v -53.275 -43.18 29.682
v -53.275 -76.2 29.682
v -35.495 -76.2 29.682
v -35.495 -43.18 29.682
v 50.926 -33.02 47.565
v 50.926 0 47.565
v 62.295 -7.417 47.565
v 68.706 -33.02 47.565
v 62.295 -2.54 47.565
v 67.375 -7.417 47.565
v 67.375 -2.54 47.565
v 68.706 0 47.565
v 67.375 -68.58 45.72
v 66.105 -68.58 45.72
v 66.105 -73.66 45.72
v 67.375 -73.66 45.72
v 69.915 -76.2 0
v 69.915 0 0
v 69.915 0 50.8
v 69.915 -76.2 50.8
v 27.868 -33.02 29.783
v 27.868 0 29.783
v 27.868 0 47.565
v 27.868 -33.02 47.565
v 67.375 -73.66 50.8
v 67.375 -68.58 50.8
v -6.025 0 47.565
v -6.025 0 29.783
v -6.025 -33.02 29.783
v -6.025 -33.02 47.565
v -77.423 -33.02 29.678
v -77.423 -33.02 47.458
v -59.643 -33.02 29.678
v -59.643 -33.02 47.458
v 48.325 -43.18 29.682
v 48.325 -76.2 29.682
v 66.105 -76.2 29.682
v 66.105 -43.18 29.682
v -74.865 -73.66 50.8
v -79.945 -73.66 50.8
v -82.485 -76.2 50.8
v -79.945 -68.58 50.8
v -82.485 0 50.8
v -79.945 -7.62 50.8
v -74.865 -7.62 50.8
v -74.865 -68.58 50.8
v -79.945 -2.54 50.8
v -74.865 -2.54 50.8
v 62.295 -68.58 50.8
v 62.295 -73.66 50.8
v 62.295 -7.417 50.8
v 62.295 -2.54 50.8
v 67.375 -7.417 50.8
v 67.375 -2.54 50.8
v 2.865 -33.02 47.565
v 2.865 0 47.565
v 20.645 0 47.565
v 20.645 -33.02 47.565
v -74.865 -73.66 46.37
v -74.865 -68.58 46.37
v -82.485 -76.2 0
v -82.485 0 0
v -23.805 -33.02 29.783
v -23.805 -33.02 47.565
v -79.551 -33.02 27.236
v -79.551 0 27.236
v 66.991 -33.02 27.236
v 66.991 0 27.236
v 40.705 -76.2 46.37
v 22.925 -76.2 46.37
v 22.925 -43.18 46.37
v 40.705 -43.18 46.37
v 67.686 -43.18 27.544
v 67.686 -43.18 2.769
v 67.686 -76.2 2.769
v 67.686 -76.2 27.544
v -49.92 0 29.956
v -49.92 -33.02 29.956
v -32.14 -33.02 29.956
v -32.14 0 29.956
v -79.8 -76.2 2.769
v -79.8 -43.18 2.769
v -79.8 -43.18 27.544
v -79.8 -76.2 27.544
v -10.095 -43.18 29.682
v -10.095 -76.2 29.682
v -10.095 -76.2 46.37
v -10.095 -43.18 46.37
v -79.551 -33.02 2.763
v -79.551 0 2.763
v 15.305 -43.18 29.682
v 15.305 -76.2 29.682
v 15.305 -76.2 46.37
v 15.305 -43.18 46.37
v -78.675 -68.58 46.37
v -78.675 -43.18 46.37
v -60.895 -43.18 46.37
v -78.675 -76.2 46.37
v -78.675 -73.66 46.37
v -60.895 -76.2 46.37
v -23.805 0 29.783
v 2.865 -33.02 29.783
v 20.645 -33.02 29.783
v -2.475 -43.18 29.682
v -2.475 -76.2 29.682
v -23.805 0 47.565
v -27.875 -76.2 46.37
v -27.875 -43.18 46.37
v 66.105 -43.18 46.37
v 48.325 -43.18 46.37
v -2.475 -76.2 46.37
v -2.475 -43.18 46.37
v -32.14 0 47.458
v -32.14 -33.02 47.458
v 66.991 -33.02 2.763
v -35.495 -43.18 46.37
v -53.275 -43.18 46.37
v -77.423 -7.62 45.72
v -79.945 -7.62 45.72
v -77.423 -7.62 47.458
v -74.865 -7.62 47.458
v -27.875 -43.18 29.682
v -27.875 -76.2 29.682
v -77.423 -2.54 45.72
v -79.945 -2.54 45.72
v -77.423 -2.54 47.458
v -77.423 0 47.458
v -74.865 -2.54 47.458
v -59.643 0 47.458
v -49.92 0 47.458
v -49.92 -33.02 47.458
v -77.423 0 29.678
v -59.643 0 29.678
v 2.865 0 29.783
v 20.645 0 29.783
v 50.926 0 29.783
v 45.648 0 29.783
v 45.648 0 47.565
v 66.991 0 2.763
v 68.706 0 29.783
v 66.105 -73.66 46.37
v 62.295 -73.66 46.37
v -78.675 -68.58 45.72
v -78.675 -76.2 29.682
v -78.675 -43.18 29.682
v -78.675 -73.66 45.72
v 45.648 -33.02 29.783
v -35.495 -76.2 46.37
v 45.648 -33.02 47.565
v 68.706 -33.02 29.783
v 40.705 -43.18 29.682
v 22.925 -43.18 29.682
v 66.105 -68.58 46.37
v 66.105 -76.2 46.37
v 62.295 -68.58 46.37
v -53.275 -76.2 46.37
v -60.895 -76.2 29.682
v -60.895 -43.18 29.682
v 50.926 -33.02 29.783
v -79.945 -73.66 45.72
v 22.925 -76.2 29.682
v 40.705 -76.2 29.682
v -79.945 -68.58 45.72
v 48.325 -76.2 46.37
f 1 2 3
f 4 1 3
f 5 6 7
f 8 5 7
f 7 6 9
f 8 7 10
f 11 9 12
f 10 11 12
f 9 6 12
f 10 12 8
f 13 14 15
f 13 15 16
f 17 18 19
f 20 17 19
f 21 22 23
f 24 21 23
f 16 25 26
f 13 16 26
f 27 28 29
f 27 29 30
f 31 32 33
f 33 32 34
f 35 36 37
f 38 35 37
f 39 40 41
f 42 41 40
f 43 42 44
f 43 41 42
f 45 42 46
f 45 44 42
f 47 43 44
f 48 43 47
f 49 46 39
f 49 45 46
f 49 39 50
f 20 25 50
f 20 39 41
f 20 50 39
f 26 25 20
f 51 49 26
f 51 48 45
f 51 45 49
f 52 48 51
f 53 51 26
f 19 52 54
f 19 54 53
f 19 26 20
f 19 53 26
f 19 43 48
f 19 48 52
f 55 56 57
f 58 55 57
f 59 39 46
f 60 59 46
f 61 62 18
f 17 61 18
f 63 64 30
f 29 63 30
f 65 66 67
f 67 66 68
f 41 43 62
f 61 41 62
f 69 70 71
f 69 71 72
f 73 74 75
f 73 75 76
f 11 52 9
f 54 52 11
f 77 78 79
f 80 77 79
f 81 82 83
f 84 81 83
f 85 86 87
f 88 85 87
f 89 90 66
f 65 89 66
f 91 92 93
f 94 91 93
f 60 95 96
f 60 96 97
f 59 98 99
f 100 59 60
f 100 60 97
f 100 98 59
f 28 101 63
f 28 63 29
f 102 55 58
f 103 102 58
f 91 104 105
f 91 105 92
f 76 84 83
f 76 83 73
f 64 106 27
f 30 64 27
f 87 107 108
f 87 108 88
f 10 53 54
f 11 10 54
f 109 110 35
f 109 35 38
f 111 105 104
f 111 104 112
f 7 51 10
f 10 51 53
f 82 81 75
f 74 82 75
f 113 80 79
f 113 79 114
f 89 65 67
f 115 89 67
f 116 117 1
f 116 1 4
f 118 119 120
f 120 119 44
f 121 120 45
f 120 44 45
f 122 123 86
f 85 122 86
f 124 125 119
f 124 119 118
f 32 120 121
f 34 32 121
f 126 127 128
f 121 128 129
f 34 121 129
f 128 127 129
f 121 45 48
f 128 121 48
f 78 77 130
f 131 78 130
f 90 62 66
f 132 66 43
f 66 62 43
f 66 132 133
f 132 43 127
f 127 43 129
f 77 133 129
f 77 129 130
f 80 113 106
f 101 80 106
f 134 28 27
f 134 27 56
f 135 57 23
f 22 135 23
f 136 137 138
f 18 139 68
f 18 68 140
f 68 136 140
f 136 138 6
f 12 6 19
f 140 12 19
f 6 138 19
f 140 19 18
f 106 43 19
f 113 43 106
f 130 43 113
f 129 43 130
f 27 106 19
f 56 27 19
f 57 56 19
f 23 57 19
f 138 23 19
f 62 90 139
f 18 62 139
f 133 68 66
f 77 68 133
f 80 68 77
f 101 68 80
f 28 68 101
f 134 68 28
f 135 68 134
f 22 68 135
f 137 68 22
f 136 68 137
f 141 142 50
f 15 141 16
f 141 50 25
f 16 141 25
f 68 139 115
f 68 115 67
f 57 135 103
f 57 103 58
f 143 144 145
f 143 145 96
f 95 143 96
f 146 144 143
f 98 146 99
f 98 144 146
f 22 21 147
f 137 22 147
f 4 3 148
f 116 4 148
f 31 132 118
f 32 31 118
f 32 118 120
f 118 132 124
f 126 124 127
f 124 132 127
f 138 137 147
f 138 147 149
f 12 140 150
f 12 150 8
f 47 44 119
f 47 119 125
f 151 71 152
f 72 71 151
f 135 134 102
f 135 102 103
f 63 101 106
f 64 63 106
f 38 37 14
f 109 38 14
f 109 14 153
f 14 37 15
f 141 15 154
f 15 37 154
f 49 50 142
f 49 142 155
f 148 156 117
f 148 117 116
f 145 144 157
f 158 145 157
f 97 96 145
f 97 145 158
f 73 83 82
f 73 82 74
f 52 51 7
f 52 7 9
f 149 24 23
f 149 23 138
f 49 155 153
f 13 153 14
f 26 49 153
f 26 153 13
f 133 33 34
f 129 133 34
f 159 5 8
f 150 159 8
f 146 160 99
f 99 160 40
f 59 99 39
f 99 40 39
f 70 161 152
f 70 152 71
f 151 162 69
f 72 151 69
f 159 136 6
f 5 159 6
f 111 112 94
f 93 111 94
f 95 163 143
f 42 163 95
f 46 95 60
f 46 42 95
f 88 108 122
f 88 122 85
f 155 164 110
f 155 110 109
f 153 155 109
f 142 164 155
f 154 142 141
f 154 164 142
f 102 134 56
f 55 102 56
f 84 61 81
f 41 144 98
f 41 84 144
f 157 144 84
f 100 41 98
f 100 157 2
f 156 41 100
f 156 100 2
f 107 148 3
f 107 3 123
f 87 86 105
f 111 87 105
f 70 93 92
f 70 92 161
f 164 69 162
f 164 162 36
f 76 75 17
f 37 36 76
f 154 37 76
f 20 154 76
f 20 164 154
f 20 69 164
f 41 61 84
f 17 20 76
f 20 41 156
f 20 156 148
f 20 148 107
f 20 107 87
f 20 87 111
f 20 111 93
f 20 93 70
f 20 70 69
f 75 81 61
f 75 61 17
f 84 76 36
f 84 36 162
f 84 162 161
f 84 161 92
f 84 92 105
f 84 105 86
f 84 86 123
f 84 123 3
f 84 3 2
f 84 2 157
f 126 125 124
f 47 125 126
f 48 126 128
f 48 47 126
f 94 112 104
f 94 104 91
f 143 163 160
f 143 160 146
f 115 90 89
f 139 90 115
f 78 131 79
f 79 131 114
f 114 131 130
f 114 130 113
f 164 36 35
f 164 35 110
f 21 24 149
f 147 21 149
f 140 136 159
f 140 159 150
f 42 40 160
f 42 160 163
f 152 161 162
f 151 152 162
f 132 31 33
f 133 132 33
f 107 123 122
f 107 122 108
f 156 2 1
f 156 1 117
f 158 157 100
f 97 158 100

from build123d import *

# Parameters (mm, degrees)
F0_W      = 152.4
F0_H      = 25.4
F1_DEPTH  = 76.2
F2_W      = 17.78
F2_H      = 17.78
F2_H_2    = 17.502186
F2_H_3    = 17.781453
F3_DEPTH  = 33.02
F4_W      = 17.78
F4_H      = 16.6878
F5_DEPTH  = 33.02
F6_W      = 146.541581
F6_H      = 24.47215
F7_DEPTH  = 33.02
F8_W      = 147.48656
F8_H      = 24.775412
F10_DEPTH = 33.02
F11_W     = 5.08
F11_H     = 5.08
F11_H_2   = 4.8768
F11_H_3   = 5.080004
F12_DEPTH = 5.08


with BuildPart() as f1:
    # F0 (on Front) → F1 (new body)
    with BuildSketch(Plane.XZ):
        with Locations((-6.284538, 38.1)):
            Rectangle(F0_W, F0_H)
        with Locations((-6.284538, 12.7)):
            Rectangle(F0_W, F0_H)
    extrude(amount=F1_DEPTH)

    # F2 (on Front) → F3 (cut)
    with BuildSketch(Plane.XZ):
        with Locations((-68.533134, 38.567891)):
            Rectangle(F2_W, F2_H)
        with Locations((-41.029694, 38.706798)):
            Rectangle(F2_W, F2_H_2)
        with Locations((-14.915321, 38.673893)):
            Rectangle(F2_W, F2_H_3)
        with Locations((11.754678, 38.673893)):
            Rectangle(F2_W, F2_H_3)
        with Locations((36.757799, 38.673893)):
            Rectangle(F2_W, F2_H_3)
        with Locations((59.816236, 38.673893)):
            Rectangle(F2_W, F2_H_3)
    extrude(amount=F3_DEPTH, mode=Mode.SUBTRACT)

    # F4 (on face) → F5 (cut)
    with BuildSketch(Plane.XZ.offset(76.2)):
        with Locations((-69.784538, 38.026275)):
            Rectangle(F4_W, F4_H)
        with Locations((-44.384538, 38.026275)):
            Rectangle(F4_W, F4_H)
        with Locations((-18.984538, 38.026275)):
            Rectangle(F4_W, F4_H)
        with Locations((6.415462, 38.026275)):
            Rectangle(F4_W, F4_H)
        with Locations((31.815462, 38.026275)):
            Rectangle(F4_W, F4_H)
        with Locations((57.215462, 38.026275)):
            Rectangle(F4_W, F4_H)
    extrude(amount=-F5_DEPTH, mode=Mode.SUBTRACT)

    # F6 (on Front) → F7 (cut)
    with BuildSketch(Plane.XZ):
        with Locations((-6.280116, 14.999481)):
            Rectangle(F6_W, F6_H)
    extrude(amount=F7_DEPTH, mode=Mode.SUBTRACT)

    # F8 (on face) → F10 (cut)
    with BuildSketch(Plane.XZ.offset(76.2)):
        with Locations((-6.05702, 15.156722)):
            Rectangle(F8_W, F8_H)
    extrude(amount=-F10_DEPTH, mode=Mode.SUBTRACT)

    # F11 (on face) → F12 (cut)
    with BuildSketch(Plane.XY.offset(50.8)):
        with Locations((-77.404538, -5.08)):
            Rectangle(F11_W, F11_H)
        with Locations((64.835462, -4.9784)):
            Rectangle(F11_W, F11_H_2)
        with Locations((64.835462, -71.12)):
            Rectangle(F11_W, F11_H)
        with Locations((-77.404538, -71.119998)):
            Rectangle(F11_W, F11_H_3)
    extrude(amount=-F12_DEPTH, mode=Mode.SUBTRACT)


solid = f1.part
